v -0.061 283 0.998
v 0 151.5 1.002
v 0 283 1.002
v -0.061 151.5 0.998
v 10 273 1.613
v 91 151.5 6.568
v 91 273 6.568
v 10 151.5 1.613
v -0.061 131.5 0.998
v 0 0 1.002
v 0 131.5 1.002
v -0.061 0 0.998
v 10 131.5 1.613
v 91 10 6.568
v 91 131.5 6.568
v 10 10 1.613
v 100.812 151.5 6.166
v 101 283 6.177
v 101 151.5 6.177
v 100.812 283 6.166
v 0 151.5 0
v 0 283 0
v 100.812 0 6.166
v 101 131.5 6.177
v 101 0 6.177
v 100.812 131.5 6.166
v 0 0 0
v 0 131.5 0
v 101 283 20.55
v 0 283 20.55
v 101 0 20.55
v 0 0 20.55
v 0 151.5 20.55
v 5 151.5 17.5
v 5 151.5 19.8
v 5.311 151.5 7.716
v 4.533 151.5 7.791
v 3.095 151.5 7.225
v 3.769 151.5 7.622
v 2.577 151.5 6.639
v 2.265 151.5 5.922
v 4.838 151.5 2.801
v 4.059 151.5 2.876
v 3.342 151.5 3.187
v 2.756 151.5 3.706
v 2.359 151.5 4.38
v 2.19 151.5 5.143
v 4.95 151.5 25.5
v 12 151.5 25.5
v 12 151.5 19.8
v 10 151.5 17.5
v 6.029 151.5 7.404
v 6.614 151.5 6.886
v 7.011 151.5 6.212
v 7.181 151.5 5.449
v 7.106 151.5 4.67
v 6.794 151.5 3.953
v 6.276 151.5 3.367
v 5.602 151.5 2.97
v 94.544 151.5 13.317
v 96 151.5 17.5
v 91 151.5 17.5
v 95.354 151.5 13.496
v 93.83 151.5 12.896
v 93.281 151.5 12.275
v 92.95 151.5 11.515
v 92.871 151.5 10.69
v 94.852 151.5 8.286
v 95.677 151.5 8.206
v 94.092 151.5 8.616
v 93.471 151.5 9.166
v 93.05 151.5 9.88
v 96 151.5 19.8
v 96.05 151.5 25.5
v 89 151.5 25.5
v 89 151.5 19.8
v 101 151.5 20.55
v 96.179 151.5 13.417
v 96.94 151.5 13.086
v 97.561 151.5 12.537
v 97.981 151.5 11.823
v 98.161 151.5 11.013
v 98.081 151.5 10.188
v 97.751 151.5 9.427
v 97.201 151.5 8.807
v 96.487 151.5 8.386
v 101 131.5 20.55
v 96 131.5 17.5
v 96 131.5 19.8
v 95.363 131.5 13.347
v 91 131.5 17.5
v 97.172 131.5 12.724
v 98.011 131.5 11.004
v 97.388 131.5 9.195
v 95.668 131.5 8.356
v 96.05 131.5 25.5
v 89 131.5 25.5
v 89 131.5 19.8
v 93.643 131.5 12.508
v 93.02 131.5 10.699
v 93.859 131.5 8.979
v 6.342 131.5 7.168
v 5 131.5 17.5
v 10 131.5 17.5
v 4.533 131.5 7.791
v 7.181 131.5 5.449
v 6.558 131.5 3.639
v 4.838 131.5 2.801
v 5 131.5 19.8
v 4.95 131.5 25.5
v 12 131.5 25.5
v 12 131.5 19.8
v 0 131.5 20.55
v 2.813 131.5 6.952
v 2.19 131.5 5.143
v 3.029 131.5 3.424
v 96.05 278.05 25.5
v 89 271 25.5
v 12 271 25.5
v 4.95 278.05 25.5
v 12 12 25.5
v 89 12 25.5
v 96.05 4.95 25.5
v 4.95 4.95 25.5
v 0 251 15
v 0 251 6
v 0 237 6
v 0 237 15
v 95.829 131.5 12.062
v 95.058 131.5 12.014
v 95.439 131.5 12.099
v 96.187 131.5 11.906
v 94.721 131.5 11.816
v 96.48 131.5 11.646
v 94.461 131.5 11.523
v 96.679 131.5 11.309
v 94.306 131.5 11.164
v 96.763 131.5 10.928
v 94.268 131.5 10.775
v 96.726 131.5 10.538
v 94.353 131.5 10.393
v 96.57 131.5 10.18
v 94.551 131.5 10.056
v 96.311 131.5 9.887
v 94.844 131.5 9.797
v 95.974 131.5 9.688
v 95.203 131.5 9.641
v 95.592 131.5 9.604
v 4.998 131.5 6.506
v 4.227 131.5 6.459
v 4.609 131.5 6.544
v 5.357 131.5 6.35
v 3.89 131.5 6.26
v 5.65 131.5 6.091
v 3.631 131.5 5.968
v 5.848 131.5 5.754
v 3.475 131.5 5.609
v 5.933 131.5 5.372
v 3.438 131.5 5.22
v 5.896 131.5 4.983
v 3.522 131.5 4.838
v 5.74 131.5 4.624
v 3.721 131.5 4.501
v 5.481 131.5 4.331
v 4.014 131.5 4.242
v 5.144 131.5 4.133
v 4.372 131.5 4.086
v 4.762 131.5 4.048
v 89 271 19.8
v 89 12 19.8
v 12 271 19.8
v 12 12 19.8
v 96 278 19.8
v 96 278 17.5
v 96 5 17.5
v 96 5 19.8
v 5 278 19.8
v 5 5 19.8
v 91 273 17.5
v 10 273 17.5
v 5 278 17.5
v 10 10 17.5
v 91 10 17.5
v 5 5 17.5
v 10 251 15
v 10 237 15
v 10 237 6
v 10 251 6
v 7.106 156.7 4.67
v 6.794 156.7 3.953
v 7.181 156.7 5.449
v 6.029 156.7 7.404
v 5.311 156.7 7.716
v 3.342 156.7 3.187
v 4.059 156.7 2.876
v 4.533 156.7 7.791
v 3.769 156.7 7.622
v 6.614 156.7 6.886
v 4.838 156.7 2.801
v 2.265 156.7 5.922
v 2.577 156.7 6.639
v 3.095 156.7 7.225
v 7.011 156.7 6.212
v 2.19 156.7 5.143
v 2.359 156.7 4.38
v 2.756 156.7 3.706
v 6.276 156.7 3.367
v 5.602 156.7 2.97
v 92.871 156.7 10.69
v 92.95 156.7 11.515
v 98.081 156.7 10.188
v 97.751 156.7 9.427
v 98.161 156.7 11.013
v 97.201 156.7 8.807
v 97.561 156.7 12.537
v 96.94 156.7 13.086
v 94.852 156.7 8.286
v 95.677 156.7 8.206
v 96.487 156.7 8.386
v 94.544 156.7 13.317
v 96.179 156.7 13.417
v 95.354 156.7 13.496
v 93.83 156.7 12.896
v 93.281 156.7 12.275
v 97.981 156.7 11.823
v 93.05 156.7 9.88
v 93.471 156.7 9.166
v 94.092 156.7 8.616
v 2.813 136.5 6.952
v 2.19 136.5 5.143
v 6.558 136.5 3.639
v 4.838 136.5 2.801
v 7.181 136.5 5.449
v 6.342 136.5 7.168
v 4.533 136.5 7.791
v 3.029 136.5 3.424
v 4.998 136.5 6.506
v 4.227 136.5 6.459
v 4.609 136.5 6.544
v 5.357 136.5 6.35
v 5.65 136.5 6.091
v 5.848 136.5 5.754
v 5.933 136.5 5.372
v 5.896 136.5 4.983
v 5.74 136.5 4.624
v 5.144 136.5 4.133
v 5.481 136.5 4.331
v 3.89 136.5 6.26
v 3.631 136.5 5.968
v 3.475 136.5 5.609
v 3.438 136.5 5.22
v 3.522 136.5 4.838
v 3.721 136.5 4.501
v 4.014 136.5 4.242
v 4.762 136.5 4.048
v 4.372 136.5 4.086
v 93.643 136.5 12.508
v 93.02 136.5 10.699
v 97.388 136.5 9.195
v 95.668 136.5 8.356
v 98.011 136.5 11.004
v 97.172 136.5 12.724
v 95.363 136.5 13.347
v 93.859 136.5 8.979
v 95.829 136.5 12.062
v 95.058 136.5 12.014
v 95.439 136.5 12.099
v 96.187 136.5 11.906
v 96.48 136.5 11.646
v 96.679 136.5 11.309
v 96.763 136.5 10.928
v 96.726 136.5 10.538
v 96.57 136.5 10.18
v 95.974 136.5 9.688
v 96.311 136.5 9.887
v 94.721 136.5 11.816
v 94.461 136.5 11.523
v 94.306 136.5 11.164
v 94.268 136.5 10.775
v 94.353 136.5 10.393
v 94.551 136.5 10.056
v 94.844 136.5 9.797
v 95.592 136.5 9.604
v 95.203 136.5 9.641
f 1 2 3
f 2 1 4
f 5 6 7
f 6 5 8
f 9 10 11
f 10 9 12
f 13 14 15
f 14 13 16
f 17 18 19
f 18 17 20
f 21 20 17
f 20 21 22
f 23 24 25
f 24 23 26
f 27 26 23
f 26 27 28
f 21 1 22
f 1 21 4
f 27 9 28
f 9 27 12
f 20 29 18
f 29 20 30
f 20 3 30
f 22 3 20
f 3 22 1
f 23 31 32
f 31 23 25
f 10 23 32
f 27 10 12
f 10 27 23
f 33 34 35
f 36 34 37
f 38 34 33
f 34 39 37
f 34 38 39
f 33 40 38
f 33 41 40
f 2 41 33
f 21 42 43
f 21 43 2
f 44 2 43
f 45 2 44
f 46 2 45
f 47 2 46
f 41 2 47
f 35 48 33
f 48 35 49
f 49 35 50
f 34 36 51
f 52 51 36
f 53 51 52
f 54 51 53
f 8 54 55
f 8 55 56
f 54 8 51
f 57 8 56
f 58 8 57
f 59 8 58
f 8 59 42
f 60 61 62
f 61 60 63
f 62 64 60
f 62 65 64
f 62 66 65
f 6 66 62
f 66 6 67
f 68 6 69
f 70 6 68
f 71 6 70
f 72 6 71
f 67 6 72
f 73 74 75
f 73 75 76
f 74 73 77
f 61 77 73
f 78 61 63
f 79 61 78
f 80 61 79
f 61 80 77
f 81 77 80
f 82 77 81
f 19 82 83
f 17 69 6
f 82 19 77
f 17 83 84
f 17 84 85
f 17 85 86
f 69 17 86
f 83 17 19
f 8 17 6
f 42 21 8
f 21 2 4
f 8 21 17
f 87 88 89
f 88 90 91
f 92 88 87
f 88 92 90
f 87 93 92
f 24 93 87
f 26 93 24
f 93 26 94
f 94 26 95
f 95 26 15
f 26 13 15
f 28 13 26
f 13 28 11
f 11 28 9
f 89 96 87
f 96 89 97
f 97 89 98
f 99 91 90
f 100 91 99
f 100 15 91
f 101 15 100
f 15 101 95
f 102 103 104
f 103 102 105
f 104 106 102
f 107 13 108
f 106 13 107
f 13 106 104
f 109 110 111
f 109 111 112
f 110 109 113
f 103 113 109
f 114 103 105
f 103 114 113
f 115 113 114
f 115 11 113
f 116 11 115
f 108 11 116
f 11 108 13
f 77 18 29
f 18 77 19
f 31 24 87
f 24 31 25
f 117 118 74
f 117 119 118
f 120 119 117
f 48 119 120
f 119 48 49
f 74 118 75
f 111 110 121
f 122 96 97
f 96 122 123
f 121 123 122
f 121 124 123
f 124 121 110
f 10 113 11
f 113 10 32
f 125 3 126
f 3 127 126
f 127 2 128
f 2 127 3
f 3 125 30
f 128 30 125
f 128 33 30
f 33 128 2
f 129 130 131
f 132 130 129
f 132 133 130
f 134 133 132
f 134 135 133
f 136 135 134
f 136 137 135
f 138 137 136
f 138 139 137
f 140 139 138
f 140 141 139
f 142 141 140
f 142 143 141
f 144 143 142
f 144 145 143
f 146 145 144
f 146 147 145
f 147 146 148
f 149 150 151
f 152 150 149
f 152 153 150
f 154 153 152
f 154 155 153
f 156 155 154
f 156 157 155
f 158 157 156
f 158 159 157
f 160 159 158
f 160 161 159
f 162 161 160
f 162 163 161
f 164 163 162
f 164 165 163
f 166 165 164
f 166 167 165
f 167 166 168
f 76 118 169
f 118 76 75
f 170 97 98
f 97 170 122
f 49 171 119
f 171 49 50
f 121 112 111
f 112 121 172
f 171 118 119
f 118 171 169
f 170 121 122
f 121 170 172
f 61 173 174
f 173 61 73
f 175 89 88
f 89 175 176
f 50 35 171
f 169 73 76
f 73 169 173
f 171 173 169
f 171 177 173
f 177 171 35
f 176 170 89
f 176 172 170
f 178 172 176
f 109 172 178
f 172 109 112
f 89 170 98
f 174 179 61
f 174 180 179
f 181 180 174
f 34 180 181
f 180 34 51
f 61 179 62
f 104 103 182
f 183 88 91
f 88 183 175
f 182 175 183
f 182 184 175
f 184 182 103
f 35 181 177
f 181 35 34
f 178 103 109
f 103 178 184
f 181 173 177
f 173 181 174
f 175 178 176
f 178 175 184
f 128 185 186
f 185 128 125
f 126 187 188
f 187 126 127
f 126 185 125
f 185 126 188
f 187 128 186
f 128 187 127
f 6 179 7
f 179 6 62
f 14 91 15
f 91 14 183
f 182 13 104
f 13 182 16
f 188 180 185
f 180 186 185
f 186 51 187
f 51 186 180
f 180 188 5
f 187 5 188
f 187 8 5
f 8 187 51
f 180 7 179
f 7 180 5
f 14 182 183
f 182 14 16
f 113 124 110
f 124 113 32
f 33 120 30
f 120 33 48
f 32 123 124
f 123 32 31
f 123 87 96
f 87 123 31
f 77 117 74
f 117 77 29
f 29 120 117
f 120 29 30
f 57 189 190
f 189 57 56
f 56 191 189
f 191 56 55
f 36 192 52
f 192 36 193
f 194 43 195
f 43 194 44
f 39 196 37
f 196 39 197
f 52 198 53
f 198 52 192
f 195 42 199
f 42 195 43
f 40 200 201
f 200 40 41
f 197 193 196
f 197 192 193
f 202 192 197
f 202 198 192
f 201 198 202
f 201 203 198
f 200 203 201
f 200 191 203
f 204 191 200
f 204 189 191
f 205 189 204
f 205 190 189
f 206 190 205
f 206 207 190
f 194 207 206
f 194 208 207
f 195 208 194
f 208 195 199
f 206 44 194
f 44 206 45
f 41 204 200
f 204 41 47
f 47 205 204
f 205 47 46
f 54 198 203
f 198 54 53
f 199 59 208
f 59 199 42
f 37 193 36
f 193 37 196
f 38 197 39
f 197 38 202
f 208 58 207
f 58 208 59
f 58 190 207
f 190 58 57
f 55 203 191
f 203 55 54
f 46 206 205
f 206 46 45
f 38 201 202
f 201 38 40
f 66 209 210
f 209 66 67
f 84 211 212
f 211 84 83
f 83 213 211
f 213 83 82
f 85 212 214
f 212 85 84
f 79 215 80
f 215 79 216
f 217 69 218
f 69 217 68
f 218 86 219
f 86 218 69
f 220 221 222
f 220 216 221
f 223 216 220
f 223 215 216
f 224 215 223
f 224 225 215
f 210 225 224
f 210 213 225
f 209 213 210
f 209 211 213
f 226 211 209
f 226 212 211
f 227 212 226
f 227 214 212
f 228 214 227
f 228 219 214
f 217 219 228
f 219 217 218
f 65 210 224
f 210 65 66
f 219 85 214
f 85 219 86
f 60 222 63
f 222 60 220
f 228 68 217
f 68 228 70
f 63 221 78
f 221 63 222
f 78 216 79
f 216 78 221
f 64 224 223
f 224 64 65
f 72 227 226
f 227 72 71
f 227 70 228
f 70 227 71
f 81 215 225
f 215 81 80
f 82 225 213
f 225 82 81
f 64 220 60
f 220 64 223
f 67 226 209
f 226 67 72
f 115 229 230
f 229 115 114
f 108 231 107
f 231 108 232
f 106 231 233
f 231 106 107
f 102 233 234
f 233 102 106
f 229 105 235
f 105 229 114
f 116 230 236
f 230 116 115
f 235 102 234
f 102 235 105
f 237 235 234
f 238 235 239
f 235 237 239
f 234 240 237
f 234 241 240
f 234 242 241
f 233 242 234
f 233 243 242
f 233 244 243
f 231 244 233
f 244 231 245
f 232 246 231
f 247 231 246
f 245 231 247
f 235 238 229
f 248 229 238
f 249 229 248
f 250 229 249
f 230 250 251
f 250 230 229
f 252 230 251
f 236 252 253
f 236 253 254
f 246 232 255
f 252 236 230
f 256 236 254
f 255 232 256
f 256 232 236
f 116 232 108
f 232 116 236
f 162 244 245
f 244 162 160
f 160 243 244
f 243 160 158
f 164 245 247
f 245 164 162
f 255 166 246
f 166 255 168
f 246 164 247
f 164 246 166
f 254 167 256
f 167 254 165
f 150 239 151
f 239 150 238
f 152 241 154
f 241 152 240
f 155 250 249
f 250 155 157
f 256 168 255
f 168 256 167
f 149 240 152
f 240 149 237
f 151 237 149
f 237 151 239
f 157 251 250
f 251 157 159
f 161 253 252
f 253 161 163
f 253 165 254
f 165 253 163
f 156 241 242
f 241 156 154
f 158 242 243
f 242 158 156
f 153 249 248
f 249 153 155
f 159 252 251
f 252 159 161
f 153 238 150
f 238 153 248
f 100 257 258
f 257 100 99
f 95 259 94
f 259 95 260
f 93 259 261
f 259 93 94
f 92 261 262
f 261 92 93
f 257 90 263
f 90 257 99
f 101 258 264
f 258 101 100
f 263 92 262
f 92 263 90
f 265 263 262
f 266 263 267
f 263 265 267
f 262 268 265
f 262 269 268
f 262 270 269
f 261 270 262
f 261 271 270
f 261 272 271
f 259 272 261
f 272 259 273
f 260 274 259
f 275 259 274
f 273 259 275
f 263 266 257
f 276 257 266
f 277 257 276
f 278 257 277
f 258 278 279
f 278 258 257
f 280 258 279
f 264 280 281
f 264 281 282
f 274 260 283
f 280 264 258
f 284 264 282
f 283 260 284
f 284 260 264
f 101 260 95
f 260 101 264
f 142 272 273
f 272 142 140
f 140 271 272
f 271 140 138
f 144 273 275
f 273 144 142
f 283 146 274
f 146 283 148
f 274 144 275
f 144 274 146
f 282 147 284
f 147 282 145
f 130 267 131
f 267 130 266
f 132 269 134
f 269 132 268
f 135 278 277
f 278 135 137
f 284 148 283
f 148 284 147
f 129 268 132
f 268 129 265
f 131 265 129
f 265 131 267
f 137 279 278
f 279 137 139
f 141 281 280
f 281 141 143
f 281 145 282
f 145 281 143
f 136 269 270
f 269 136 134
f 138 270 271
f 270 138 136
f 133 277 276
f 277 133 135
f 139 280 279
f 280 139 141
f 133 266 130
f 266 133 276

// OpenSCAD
//UT47 Case Cad file
// -Rev 2: add rotate to make it easier to print.
// -Rev 3: increase case height, increase plateHeight.
// -Rev 3a: remove screw holes.
// -Rev 3b: lowered plate holder slightly.
// -Rev 4: included pegs, moved usb hole over, slighty raised lip.
// -Rev 4a: updated pegs to hopefully fit better.
// -Rev 5: Decreased length by 1, increase peg holes, fit usb hole

//Gap to split in half
plateGap=20;

//Enter Plate dimensions
plateLength=91;
plateWidth=253+plateGap;
plateHeight=2.3;

//How large of a lip do you want the plate to sit in
plateHolderWidth=14;
//How far down do you want the plate to sit from the top
plateDepth=8;

//Enter how much you want the case to extrude from the plate
extrude = 10;
length=plateLength+extrude;
width=plateWidth+extrude;

//Enter the total height of the case
height=25.5;

//Enter how far from the edge the holes should be
holeOffset=5;

//Calculate the necessary inner dimensions
innerLength=plateLength-plateHolderWidth;
innerWidth=plateWidth-plateHolderWidth;
innerHeight=height;

//Enter desired slant angle of case
angle=3.5;
flattenHeight=(cos(90-angle))*width;

//Enter desired edge settings
edgeCutAngle=45;
edgeCutWidth=7;
edgeCutHeight1=edgeCutWidth*(cos(90-edgeCutAngle));
edgeCutHeight2=edgeCutHeight1*(cos(90-edgeCutAngle));
edgeCutTranslate=edgeCutHeight1;

//Helpful Rotation axis
xAxisRotate=[1,0,0];
yAxisRotate=[0,1,0];
zAxisRotate=[0,0,1];


//Create base of the case
rotate(a=-angle,v=(yAxisRotate))
difference()
{
        //Create bottom fill
        cube([length,width,1]);
        
	    //Create the block to cut it in half
        translate([0,(width-plateGap)/2,0])
        cube([length,plateGap,height]);
}

//Create the rest of the case
rotate(a=-angle,v=(yAxisRotate))
{
    difference()
    {
        rotate(a=angle,v=(yAxisRotate))
        difference()
        {
            //Create initial block
            cube([length,width,height]);
            
            //Create the block to cut it in half
            translate([0,(width-plateGap)/2,0])
            cube([length,plateGap,height]);
            
            //Crea//Create the rest of the casete initial inner cut (upper most cutout)
            translate([(length-innerLength)/2,(width-innerWidth)/2,0])
            cube([innerLength,innerWidth,innerHeight]);
            
            //Create plate holder cut
            translate([((length-innerLength)/2)-(plateHolderWidth/2),((width-innerWidth)/2)-(plateHolderWidth/2),height-plateDepth])
            cube([plateLength,plateWidth,plateHeight]);
            
            //Create USB hole
            translate([0,((width)-(((width-innerWidth)/2)-(plateHolderWidth/2)))-41,height-plateDepth-11.5])
            cube([20,14,9]);
            
            //create second inner cut (bottom most cutout)
            translate([((length-innerLength)/2)-2,((width-innerWidth)/2)-2,-plateDepth+4])
            cube([plateLength-(plateHolderWidth/2)-3,plateWidth-(plateHolderWidth/2)-3,height-plateHeight]);
            
            //Create edge cuts
            translate([0,0,height-edgeCutTranslate])
            rotate(a=-edgeCutAngle,v=yAxisRotate)
            cube([edgeCutWidth,width,edgeCutHeight2]);
            
            translate([0,0,height-edgeCutTranslate])
            rotate(a=edgeCutAngle,v=xAxisRotate)
            cube([length,edgeCutWidth,edgeCutHeight2]);    
            
            translate([length-edgeCutTranslate,0,height])
            rotate(a=edgeCutAngle,v=yAxisRotate)
            cube([edgeCutWidth,width,edgeCutHeight2]);
            
            translate([0,width-edgeCutTranslate,height])
            rotate(a=-edgeCutAngle,v=xAxisRotate)
            cube([length,edgeCutWidth,edgeCutHeight2]);  
        }
        
        //Flatten the base
        translate([0,0,-flattenHeight])
        cube([length+100,width+100,flattenHeight]);
        
        //Create peg holes, slightly larger than the pegs
        translate([5,(width+plateGap)/2,5])
        rotate(a=-90,v=(xAxisRotate))
        cylinder(5.2,d=5,$fn=20);
        translate([length-5,(width+plateGap)/2,5])
        rotate(a=-90,v=(xAxisRotate))
        cylinder(5.2,d=5.3,$fn=20);
    }

    //Create pegs
    translate([5,(width-plateGap)/2,5])
    rotate(a=-90,v=(xAxisRotate))
    difference()
    {
        cylinder(5,d=5);
        cylinder(5,d=2.5,$fn=20);
    }
    translate([length-5,(width-plateGap)/2,5])
    rotate(a=-90,v=(xAxisRotate))
    difference()
    {
        cylinder(5,d=5);
        cylinder(5,d=2.5,$fn=20);
    }

}
